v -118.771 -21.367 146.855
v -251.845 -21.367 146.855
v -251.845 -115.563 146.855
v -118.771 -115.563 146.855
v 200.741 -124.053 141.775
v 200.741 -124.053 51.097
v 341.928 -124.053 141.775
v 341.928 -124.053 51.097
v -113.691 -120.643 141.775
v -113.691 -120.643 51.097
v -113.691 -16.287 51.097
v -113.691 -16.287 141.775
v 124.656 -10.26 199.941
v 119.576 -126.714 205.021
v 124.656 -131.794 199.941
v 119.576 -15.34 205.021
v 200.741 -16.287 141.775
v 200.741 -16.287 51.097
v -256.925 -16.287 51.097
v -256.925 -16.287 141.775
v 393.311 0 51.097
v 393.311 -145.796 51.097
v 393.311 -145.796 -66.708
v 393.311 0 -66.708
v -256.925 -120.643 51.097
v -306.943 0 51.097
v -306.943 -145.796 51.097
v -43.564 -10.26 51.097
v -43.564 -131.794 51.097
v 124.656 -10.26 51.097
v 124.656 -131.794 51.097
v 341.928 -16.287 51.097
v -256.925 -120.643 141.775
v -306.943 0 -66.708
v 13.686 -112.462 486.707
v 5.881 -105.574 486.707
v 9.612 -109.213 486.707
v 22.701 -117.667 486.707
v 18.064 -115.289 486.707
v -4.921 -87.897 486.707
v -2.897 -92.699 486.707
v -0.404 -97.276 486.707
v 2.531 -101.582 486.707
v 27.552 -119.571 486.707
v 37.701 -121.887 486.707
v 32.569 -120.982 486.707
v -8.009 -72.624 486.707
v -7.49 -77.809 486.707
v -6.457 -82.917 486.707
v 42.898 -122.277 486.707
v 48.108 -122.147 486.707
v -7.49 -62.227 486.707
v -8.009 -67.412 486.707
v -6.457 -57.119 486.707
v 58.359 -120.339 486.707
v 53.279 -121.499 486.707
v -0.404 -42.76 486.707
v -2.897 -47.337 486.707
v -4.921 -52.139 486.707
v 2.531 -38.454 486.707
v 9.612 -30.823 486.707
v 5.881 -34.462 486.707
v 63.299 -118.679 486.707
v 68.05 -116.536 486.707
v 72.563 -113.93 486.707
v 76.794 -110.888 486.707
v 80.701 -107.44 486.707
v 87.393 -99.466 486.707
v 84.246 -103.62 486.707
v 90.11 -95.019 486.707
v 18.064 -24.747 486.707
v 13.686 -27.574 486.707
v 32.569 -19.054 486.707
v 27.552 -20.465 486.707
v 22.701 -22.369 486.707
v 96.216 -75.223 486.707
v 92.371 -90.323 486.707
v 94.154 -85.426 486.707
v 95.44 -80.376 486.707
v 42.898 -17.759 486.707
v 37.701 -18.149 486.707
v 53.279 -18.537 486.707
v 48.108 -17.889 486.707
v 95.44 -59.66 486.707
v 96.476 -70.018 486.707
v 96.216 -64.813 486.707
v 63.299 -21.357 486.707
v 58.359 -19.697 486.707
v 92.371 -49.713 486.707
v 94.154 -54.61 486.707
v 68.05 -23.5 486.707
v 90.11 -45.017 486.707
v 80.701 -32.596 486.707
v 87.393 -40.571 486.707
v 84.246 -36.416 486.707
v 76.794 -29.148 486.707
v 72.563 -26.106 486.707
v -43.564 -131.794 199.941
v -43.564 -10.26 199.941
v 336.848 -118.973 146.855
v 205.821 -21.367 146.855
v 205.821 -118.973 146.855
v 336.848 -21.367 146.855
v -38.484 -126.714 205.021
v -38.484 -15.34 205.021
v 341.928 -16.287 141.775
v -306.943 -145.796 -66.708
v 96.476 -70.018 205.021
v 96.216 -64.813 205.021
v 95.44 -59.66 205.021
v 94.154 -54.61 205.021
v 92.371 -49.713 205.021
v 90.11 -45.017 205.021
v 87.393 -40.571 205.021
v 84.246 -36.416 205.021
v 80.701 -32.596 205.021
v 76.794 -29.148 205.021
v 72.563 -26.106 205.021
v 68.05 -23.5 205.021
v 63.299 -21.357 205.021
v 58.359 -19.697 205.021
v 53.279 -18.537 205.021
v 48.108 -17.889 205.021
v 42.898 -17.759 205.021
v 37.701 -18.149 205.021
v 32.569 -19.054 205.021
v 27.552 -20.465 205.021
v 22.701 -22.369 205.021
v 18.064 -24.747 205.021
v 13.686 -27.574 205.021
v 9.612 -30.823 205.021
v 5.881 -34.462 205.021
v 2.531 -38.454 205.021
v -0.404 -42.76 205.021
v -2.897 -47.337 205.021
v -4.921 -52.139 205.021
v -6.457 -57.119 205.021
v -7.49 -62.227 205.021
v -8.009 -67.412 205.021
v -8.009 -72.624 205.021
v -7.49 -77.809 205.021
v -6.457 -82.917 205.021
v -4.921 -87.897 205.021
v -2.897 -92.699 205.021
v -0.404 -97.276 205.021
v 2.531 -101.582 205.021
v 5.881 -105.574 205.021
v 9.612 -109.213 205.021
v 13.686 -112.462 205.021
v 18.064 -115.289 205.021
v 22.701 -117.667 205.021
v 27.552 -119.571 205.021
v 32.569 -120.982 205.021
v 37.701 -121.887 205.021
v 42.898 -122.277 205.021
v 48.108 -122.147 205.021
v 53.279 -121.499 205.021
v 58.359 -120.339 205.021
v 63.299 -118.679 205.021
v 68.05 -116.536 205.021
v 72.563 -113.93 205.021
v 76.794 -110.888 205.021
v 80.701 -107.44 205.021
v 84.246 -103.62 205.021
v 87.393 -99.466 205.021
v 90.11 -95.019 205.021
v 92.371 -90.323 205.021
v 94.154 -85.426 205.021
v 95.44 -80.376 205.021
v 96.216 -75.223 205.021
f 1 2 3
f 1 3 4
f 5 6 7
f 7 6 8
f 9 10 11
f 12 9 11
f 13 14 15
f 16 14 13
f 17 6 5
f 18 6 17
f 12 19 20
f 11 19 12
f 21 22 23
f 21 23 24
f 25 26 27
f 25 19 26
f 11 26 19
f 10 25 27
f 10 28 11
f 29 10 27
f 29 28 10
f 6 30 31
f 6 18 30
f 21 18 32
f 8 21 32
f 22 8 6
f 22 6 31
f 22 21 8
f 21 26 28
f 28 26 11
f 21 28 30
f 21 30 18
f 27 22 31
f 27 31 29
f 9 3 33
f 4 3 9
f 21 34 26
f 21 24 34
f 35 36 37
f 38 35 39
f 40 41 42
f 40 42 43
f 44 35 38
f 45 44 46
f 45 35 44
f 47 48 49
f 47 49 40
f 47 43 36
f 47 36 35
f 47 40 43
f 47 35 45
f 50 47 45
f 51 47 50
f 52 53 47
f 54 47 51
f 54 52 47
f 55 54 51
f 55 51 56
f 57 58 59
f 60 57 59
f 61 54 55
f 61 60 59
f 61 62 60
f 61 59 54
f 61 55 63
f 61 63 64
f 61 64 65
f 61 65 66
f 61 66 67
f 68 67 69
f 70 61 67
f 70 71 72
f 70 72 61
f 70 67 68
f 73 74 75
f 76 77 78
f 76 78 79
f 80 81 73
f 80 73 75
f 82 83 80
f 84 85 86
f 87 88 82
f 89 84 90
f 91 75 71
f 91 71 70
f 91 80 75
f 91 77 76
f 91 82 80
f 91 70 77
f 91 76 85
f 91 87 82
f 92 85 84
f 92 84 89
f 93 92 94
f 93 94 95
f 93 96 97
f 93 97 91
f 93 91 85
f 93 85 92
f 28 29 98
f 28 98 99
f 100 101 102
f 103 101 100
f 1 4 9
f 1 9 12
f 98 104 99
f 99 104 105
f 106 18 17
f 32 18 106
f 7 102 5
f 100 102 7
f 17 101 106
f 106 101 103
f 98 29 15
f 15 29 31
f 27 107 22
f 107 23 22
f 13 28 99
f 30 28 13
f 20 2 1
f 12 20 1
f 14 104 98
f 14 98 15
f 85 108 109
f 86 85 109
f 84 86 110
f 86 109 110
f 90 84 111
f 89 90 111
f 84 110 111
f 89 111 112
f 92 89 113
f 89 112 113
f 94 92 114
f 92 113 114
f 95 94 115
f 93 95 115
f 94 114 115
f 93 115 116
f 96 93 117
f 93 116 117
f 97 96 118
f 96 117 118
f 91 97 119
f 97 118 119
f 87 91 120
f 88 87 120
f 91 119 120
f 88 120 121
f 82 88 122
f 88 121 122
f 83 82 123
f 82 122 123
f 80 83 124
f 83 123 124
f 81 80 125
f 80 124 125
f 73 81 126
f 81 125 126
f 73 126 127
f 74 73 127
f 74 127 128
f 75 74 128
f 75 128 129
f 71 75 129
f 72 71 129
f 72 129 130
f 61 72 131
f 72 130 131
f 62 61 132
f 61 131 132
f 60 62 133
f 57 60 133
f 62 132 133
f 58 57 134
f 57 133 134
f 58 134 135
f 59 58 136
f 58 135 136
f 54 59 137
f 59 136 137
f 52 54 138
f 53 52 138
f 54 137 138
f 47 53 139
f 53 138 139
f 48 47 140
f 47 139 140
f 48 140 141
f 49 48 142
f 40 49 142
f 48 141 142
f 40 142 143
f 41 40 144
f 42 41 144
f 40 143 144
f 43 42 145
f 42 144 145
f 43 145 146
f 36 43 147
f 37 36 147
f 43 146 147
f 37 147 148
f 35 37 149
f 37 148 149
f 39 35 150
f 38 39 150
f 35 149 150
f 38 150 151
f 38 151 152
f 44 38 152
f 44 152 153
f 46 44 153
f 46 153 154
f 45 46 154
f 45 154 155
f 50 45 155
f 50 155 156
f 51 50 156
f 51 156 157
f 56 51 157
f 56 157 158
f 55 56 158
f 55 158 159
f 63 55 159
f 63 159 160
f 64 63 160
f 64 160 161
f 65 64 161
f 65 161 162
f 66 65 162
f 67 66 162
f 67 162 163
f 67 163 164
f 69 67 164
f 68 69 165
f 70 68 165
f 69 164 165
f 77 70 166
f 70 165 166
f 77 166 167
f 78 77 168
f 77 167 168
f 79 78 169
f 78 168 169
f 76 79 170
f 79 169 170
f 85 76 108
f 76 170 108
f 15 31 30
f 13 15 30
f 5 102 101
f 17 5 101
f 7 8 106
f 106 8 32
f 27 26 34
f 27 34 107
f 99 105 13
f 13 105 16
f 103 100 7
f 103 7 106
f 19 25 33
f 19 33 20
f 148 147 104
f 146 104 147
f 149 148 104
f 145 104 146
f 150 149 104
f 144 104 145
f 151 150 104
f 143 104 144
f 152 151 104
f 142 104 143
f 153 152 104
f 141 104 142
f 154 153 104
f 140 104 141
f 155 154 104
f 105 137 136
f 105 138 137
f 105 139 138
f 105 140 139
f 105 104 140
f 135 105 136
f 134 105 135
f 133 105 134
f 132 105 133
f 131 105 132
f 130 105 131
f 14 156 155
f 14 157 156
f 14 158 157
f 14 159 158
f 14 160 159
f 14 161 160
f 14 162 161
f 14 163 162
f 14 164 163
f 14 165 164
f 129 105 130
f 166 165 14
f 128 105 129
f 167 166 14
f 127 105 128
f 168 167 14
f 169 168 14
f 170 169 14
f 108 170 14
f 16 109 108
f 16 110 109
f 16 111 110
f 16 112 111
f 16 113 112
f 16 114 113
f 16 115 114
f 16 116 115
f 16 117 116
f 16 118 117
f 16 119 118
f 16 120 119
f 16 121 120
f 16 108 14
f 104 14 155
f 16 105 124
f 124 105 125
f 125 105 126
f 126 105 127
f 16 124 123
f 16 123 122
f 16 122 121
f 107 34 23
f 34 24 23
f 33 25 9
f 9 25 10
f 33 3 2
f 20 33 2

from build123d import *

# Parameters (mm, degrees)
F0_W      = 101.3216488063
F0_H      = 117.805339396
F1_DEPTH  = 145.796
F2_W      = 145.796
F2_H      = 117.805339396
F3_DEPTH  = 89.916
F4_W      = 168.2205758989
F4_H      = 121.5348821133
F5_DEPTH  = 153.924
F6_SIZE   = 5.08
F7_W      = 145.796
F7_H      = 117.805339396
F8_DEPTH  = 254.508
F9_W      = 145.796
F9_H      = 117.805339396
F10_DEPTH = 254.508
F11_W     = 143.2336866856
F11_H     = 104.3559815735
F11_W_2   = 141.1875188351
F11_H_2   = 107.7663134784
F12_DEPTH = 95.758
F13_SIZE  = 5.08
F14_R     = 52.2748523049
F15_DEPTH = 281.686


with BuildPart() as f1:
    # F0 (on Front) → F1 (new body)
    with BuildSketch(Plane.XZ):
        with Locations((-1.7741117626, -7.8057236969)):
            Rectangle(F0_W, F0_H)
    extrude(amount=F1_DEPTH)

    # F2 (on face) → F3 (join)
    with BuildSketch(Plane.YZ.offset(48.8867126405)):
        with Locations((-72.898, -7.8057236969)):
            Rectangle(F2_W, F2_H)
    extrude(amount=F3_DEPTH)

    # F4 (on face) → F5 (join)
    with BuildSketch(Plane.XY.offset(51.0969460011)):
        with Locations((40.545957163, -71.0269669071)):
            Rectangle(F4_W, F4_H)
    extrude(amount=F5_DEPTH)

    # F6
    f6_edges = [f1.edges().sort_by_distance(p)[0] for p in [
        (40.545957, -131.794408, 205.020946),
        (124.656245, -71.026967, 205.020946),
        (40.545957, -10.259526, 205.020946),
        (-43.564331, -71.026967, 205.020946),
    ]]
    chamfer(f6_edges, length=F6_SIZE)

    # F7 (on face) → F8 (join)
    with BuildSketch(Plane.YZ.offset(138.8027126405)):
        with Locations((-72.898, -7.8057236969)):
            Rectangle(F7_W, F7_H)
    extrude(amount=F8_DEPTH)

    # F9 (on face) → F10 (join)
    with BuildSketch(Plane(origin=(-52.4349361658, 0, 0), x_dir=(0, -1, 0), z_dir=(-1, 0, 0))):
        with Locations((72.898, -7.8057236969)):
            Rectangle(F9_W, F9_H)
    extrude(amount=F10_DEPTH)

    # F11 (on face) → F12 (join)
    with BuildSketch(Plane.XY.offset(51.0969460011)):
        with Locations((-185.3079646826, -68.4645744041)):
            Rectangle(F11_W, F11_H)
        with Locations((271.3347226381, -70.1697403565)):
            Rectangle(F11_W_2, F11_H_2)
    extrude(amount=F12_DEPTH)

    # F13
    f13_edges = [f1.edges().sort_by_distance(p)[0] for p in [
        (-185.307965, -16.286584, 146.854946),
        (-113.691121, -68.464574, 146.854946),
        (-185.307965, -120.642565, 146.854946),
        (-256.924808, -68.464574, 146.854946),
        (271.334723, -16.286584, 146.854946),
        (200.740963, -70.16974, 146.854946),
        (341.928482, -70.16974, 146.854946),
        (271.334723, -124.052897, 146.854946),
    ]]
    chamfer(f13_edges, length=F13_SIZE)

    # F14 (on face) → F15 (join)
    with BuildSketch(Plane.XY.offset(205.0209460011)):
        with Locations((44.2011877894, -70.0180381536)):
            Circle(F14_R)
    extrude(amount=F15_DEPTH)


solid = f1.part
